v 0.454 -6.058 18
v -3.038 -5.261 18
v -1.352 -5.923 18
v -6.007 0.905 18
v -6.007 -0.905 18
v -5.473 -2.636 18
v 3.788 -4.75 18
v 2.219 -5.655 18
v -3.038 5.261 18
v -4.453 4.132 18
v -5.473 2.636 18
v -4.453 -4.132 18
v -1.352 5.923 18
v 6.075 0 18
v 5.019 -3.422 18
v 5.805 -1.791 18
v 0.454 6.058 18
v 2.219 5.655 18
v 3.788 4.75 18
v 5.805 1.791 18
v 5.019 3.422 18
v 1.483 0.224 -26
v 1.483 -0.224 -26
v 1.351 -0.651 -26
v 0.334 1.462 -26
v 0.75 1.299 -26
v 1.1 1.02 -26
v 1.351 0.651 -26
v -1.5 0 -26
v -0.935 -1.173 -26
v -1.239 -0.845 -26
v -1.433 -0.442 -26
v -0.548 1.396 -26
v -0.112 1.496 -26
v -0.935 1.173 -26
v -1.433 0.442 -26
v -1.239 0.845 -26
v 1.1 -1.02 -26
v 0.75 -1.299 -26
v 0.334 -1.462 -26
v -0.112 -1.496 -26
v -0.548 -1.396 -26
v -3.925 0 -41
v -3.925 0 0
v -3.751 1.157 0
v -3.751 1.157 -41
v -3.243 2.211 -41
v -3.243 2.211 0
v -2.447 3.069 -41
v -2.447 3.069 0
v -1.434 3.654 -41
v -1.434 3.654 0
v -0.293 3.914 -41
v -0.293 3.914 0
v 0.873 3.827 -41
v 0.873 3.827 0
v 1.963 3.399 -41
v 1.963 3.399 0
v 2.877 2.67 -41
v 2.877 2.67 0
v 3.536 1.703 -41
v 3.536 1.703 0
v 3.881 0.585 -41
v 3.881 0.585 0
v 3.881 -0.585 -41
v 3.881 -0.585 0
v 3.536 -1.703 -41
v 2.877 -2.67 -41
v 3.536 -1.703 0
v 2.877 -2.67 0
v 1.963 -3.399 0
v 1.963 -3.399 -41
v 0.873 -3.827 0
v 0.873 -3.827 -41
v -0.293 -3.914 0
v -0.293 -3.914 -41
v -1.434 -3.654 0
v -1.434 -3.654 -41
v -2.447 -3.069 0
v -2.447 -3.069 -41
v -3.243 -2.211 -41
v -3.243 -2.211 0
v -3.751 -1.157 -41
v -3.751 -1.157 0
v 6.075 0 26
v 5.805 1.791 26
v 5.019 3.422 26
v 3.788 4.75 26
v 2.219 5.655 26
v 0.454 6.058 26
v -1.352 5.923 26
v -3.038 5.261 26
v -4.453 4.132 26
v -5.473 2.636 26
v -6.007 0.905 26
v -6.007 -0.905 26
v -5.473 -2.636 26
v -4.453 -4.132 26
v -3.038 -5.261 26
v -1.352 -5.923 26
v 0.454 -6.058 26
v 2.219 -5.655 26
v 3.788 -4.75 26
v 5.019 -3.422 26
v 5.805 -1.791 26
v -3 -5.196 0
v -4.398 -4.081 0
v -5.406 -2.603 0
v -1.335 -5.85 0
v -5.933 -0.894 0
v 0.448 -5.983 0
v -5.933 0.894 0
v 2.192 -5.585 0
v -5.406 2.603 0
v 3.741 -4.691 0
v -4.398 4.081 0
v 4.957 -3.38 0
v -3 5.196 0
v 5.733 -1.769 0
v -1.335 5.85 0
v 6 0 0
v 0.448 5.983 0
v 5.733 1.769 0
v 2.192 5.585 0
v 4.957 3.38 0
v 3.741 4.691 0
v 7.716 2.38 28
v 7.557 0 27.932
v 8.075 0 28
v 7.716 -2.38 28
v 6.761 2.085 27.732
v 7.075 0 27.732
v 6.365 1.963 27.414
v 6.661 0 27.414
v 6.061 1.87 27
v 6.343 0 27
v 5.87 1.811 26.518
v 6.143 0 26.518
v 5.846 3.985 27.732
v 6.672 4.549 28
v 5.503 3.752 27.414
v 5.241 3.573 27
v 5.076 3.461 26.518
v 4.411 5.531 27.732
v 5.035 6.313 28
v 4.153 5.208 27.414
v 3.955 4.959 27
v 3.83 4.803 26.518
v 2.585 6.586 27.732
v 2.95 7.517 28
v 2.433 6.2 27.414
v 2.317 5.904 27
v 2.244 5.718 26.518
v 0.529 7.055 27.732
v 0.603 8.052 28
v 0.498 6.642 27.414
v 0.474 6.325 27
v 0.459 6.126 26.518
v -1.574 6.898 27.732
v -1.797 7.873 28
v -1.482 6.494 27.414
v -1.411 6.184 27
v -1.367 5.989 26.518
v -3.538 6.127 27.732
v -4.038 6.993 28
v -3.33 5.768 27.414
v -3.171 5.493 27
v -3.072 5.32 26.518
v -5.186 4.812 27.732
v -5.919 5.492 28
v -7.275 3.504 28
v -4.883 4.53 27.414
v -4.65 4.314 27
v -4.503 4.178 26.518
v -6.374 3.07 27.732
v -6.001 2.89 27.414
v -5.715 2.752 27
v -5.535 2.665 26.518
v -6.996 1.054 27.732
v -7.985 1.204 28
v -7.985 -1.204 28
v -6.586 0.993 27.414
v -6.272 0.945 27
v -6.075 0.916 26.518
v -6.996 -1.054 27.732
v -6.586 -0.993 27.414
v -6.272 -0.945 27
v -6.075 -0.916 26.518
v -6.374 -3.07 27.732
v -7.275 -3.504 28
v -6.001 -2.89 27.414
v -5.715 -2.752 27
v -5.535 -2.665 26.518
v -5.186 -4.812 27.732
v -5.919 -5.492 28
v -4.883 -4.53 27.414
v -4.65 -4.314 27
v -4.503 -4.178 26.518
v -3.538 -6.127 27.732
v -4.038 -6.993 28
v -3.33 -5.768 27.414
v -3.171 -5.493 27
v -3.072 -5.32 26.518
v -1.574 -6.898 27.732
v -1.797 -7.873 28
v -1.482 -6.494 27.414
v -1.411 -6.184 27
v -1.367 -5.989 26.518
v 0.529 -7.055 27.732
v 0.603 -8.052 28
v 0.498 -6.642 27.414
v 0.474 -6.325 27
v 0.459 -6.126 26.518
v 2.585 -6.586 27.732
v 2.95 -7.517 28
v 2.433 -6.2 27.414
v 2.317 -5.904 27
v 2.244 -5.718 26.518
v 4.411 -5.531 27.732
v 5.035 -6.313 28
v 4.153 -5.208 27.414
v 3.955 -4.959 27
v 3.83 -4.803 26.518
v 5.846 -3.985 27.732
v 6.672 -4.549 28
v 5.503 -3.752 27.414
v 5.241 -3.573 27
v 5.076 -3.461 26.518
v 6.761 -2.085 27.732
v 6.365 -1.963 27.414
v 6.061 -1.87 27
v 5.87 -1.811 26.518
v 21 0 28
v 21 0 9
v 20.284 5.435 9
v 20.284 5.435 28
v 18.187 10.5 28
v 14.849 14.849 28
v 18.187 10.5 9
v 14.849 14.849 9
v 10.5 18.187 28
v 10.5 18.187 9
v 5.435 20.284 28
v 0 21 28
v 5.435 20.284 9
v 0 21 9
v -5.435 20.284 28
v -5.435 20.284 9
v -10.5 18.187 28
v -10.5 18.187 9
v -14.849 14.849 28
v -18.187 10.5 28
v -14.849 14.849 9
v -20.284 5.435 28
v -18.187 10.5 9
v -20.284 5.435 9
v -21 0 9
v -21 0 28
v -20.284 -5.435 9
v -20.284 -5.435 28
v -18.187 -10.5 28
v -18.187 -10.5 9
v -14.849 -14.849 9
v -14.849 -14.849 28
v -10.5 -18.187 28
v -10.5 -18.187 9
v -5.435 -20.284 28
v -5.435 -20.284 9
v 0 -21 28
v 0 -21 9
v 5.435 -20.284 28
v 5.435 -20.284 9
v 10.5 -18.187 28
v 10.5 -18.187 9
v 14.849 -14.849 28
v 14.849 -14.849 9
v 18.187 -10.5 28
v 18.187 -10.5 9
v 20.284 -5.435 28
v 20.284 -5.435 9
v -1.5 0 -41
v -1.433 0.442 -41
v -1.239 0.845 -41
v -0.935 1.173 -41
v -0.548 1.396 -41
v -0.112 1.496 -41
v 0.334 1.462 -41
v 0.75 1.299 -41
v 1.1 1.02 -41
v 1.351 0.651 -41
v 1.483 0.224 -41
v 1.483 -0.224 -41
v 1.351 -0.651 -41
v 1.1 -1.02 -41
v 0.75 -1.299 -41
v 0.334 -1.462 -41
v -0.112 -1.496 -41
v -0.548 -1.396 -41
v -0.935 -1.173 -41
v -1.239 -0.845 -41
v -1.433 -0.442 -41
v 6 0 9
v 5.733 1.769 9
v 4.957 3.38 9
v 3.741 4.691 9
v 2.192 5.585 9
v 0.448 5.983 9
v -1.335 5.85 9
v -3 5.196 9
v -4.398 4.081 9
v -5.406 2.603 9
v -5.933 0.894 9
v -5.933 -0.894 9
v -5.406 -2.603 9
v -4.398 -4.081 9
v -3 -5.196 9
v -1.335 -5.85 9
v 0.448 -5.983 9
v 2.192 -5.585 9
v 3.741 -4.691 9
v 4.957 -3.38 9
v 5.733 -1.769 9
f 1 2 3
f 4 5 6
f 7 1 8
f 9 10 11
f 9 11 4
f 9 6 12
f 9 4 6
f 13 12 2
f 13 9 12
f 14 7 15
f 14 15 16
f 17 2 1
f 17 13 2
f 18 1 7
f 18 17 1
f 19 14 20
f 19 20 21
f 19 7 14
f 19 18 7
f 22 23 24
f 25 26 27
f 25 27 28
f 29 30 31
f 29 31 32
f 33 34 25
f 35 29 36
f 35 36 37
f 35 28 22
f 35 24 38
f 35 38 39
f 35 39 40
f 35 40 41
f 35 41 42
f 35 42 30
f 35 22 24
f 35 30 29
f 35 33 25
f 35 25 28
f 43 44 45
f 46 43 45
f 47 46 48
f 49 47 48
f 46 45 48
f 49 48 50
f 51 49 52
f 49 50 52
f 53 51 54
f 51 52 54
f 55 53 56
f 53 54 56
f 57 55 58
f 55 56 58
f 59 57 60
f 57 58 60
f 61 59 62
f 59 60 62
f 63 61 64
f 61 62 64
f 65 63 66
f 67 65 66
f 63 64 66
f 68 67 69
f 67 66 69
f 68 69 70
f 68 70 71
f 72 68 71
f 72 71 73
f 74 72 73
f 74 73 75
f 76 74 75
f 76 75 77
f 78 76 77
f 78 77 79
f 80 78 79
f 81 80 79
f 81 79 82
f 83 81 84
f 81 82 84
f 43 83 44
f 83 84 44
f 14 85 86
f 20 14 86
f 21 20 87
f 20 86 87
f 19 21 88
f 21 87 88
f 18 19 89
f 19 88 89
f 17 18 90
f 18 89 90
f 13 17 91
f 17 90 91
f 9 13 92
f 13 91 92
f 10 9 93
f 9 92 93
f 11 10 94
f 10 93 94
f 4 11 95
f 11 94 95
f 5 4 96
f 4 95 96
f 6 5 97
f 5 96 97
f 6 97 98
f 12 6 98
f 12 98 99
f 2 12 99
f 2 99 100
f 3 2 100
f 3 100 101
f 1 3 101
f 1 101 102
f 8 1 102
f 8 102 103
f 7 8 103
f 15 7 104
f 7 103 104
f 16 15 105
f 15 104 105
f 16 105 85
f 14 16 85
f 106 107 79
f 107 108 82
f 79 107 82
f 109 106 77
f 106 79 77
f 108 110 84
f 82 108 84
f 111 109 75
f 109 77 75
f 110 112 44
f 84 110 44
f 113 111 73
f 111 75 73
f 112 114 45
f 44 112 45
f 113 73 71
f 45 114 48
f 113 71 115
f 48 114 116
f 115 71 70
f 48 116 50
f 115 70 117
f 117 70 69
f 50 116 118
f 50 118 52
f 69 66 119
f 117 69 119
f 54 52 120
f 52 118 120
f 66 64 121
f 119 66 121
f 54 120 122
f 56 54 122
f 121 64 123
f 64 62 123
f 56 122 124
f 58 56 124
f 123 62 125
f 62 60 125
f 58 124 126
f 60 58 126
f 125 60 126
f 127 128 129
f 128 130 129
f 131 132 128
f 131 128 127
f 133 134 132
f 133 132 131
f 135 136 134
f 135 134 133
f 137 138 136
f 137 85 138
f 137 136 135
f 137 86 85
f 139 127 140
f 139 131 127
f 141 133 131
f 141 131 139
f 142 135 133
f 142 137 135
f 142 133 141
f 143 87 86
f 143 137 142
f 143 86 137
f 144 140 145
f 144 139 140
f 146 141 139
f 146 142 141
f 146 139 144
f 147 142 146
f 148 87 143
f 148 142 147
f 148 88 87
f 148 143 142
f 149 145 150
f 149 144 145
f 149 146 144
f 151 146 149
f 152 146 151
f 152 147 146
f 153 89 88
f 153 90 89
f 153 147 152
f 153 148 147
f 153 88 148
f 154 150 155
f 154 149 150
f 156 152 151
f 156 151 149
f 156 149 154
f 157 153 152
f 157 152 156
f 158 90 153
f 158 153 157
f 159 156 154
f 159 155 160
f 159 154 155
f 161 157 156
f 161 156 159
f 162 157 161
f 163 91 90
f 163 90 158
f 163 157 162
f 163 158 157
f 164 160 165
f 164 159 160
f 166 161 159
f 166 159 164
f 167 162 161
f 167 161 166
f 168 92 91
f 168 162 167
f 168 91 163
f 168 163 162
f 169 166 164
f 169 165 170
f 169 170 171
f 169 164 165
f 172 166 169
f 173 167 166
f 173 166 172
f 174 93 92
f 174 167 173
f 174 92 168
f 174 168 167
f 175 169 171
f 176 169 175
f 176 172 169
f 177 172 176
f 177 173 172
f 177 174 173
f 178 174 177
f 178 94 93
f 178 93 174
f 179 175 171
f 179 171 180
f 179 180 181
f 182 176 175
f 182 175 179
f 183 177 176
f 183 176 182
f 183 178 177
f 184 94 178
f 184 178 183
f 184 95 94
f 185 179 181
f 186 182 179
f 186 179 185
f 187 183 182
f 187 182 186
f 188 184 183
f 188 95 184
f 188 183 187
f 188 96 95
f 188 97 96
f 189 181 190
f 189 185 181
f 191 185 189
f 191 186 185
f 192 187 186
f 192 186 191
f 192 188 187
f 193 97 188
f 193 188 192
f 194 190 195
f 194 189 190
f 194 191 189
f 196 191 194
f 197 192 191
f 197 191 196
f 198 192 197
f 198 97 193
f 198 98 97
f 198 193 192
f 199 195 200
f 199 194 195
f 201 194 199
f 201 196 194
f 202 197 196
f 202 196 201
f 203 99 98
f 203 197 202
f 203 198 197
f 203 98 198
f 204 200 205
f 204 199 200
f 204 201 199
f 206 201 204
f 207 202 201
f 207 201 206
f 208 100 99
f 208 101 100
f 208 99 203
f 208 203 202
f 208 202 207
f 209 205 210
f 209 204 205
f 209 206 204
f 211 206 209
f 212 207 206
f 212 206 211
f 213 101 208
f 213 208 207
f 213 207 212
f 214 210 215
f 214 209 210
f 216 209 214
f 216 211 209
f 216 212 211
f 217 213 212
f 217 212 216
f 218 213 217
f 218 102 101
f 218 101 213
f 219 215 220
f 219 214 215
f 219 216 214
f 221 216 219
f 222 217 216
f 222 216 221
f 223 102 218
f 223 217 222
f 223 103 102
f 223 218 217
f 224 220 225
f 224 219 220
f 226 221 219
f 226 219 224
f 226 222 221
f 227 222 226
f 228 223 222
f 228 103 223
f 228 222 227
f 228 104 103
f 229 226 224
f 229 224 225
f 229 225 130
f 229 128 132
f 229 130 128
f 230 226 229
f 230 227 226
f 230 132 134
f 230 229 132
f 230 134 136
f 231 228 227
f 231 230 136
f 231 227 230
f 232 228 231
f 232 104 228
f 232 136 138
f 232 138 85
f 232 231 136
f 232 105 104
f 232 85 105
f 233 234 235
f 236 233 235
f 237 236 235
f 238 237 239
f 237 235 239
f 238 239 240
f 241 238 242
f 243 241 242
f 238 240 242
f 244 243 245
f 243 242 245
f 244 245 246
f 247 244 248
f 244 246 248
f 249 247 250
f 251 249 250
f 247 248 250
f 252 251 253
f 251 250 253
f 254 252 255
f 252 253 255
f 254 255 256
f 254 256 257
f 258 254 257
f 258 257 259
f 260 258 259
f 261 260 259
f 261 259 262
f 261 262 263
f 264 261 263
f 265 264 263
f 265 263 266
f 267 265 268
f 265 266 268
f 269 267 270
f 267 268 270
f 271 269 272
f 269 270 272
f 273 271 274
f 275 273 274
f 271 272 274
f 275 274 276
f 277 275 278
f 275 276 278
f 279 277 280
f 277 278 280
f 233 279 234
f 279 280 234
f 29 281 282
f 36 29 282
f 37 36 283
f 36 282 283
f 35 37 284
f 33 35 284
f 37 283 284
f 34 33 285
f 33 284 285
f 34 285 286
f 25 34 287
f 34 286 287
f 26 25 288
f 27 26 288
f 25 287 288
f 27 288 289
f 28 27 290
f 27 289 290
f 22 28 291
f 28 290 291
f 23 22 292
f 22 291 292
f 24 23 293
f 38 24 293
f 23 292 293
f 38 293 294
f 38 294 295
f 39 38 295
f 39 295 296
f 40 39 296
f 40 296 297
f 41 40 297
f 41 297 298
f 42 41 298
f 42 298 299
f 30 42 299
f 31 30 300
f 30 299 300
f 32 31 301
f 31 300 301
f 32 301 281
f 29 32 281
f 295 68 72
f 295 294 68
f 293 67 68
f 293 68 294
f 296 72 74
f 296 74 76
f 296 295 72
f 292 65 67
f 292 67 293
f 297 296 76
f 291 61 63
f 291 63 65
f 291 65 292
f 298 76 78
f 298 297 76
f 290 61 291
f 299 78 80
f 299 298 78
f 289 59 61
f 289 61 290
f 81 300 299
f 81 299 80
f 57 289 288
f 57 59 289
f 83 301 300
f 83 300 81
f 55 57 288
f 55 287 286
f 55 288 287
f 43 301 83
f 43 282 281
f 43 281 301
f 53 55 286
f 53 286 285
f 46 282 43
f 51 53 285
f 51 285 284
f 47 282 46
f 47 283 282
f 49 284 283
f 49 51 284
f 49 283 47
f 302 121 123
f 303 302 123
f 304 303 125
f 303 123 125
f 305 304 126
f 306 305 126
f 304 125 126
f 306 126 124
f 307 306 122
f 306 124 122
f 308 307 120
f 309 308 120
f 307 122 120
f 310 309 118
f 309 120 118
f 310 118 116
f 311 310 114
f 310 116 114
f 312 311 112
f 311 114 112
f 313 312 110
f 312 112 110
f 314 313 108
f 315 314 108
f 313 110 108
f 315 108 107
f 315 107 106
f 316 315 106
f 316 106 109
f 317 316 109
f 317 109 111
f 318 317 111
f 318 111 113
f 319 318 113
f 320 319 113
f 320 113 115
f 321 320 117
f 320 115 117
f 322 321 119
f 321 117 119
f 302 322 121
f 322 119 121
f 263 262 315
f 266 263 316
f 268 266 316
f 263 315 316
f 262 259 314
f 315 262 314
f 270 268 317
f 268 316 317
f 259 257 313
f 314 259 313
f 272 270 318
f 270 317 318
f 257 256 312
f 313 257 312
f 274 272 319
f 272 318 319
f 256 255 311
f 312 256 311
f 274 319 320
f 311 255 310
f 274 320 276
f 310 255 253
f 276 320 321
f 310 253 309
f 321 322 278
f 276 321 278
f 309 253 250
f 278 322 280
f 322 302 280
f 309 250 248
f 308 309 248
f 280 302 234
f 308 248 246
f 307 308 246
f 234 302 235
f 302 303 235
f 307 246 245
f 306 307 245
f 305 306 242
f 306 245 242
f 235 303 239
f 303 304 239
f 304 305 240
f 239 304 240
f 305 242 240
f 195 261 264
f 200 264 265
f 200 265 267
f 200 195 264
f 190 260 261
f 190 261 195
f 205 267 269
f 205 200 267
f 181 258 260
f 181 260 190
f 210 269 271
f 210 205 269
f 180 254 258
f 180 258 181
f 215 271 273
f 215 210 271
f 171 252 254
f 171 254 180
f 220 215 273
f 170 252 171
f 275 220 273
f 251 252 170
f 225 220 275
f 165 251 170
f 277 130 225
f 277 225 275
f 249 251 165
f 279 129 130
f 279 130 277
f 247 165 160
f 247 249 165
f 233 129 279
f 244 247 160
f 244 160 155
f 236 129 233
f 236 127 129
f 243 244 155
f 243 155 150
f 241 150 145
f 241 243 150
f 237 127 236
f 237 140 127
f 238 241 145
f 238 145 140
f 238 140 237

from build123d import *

# Parameters (mm, degrees)
SKIZZE1_R                       = 6
AUFSATZ_LINEAR_AUSTRAGEN1_DEPTH = 9
SKIZZE2_R                       = 3.925
AUFSATZ_LINEAR_AUSTRAGEN2_DEPTH = 41
SKIZZE3_R                       = 21
AUFSATZ_LINEAR_AUSTRAGEN3_DEPTH = 19
SKIZZE4_R                       = 6.075
SCHNITT_LINEAR_AUSTRAGEN2_DEPTH = 10
VERRUNDUNG1_R                   = 2
SKIZZE5_R                       = 1.5
SCHNITT_LINEAR_AUSTRAGEN3_DEPTH = 15


with BuildPart() as part:
    # Skizze1 → Aufsatz-Linear austragen1 (new body)
    with BuildSketch(Plane.XY):
        Circle(SKIZZE1_R)
    extrude(amount=AUFSATZ_LINEAR_AUSTRAGEN1_DEPTH)

    # Skizze2 → Aufsatz-Linear austragen2 (add)
    with BuildSketch(Plane(origin=(0, 0, 0), x_dir=(-1, 0, 0), z_dir=(0, 0, -1))):
        Circle(SKIZZE2_R)
    extrude(amount=AUFSATZ_LINEAR_AUSTRAGEN2_DEPTH)

    # Skizze3 → Aufsatz-Linear austragen3 (add)
    with BuildSketch(Plane.XY.offset(9)):
        Circle(SKIZZE3_R)
    extrude(amount=AUFSATZ_LINEAR_AUSTRAGEN3_DEPTH)

    # Skizze4 → Schnitt-Linear austragen2 (cut)
    with BuildSketch(Plane.XY.offset(28)):
        Circle(SKIZZE4_R)
    extrude(amount=-SCHNITT_LINEAR_AUSTRAGEN2_DEPTH, mode=Mode.SUBTRACT)

    # Verrundung1
    verrundung1_edges = [part.edges().sort_by_distance(p)[0] for p in [
        (-6.075, 0, 28),
    ]]
    fillet(verrundung1_edges, radius=VERRUNDUNG1_R)

    # Skizze5 → Schnitt-Linear austragen3 (cut)
    with BuildSketch(Plane(origin=(0, 0, -41), x_dir=(-1, 0, 0), z_dir=(0, 0, -1))):
        Circle(SKIZZE5_R)
    extrude(amount=-SCHNITT_LINEAR_AUSTRAGEN3_DEPTH, mode=Mode.SUBTRACT)


solid = part.part
